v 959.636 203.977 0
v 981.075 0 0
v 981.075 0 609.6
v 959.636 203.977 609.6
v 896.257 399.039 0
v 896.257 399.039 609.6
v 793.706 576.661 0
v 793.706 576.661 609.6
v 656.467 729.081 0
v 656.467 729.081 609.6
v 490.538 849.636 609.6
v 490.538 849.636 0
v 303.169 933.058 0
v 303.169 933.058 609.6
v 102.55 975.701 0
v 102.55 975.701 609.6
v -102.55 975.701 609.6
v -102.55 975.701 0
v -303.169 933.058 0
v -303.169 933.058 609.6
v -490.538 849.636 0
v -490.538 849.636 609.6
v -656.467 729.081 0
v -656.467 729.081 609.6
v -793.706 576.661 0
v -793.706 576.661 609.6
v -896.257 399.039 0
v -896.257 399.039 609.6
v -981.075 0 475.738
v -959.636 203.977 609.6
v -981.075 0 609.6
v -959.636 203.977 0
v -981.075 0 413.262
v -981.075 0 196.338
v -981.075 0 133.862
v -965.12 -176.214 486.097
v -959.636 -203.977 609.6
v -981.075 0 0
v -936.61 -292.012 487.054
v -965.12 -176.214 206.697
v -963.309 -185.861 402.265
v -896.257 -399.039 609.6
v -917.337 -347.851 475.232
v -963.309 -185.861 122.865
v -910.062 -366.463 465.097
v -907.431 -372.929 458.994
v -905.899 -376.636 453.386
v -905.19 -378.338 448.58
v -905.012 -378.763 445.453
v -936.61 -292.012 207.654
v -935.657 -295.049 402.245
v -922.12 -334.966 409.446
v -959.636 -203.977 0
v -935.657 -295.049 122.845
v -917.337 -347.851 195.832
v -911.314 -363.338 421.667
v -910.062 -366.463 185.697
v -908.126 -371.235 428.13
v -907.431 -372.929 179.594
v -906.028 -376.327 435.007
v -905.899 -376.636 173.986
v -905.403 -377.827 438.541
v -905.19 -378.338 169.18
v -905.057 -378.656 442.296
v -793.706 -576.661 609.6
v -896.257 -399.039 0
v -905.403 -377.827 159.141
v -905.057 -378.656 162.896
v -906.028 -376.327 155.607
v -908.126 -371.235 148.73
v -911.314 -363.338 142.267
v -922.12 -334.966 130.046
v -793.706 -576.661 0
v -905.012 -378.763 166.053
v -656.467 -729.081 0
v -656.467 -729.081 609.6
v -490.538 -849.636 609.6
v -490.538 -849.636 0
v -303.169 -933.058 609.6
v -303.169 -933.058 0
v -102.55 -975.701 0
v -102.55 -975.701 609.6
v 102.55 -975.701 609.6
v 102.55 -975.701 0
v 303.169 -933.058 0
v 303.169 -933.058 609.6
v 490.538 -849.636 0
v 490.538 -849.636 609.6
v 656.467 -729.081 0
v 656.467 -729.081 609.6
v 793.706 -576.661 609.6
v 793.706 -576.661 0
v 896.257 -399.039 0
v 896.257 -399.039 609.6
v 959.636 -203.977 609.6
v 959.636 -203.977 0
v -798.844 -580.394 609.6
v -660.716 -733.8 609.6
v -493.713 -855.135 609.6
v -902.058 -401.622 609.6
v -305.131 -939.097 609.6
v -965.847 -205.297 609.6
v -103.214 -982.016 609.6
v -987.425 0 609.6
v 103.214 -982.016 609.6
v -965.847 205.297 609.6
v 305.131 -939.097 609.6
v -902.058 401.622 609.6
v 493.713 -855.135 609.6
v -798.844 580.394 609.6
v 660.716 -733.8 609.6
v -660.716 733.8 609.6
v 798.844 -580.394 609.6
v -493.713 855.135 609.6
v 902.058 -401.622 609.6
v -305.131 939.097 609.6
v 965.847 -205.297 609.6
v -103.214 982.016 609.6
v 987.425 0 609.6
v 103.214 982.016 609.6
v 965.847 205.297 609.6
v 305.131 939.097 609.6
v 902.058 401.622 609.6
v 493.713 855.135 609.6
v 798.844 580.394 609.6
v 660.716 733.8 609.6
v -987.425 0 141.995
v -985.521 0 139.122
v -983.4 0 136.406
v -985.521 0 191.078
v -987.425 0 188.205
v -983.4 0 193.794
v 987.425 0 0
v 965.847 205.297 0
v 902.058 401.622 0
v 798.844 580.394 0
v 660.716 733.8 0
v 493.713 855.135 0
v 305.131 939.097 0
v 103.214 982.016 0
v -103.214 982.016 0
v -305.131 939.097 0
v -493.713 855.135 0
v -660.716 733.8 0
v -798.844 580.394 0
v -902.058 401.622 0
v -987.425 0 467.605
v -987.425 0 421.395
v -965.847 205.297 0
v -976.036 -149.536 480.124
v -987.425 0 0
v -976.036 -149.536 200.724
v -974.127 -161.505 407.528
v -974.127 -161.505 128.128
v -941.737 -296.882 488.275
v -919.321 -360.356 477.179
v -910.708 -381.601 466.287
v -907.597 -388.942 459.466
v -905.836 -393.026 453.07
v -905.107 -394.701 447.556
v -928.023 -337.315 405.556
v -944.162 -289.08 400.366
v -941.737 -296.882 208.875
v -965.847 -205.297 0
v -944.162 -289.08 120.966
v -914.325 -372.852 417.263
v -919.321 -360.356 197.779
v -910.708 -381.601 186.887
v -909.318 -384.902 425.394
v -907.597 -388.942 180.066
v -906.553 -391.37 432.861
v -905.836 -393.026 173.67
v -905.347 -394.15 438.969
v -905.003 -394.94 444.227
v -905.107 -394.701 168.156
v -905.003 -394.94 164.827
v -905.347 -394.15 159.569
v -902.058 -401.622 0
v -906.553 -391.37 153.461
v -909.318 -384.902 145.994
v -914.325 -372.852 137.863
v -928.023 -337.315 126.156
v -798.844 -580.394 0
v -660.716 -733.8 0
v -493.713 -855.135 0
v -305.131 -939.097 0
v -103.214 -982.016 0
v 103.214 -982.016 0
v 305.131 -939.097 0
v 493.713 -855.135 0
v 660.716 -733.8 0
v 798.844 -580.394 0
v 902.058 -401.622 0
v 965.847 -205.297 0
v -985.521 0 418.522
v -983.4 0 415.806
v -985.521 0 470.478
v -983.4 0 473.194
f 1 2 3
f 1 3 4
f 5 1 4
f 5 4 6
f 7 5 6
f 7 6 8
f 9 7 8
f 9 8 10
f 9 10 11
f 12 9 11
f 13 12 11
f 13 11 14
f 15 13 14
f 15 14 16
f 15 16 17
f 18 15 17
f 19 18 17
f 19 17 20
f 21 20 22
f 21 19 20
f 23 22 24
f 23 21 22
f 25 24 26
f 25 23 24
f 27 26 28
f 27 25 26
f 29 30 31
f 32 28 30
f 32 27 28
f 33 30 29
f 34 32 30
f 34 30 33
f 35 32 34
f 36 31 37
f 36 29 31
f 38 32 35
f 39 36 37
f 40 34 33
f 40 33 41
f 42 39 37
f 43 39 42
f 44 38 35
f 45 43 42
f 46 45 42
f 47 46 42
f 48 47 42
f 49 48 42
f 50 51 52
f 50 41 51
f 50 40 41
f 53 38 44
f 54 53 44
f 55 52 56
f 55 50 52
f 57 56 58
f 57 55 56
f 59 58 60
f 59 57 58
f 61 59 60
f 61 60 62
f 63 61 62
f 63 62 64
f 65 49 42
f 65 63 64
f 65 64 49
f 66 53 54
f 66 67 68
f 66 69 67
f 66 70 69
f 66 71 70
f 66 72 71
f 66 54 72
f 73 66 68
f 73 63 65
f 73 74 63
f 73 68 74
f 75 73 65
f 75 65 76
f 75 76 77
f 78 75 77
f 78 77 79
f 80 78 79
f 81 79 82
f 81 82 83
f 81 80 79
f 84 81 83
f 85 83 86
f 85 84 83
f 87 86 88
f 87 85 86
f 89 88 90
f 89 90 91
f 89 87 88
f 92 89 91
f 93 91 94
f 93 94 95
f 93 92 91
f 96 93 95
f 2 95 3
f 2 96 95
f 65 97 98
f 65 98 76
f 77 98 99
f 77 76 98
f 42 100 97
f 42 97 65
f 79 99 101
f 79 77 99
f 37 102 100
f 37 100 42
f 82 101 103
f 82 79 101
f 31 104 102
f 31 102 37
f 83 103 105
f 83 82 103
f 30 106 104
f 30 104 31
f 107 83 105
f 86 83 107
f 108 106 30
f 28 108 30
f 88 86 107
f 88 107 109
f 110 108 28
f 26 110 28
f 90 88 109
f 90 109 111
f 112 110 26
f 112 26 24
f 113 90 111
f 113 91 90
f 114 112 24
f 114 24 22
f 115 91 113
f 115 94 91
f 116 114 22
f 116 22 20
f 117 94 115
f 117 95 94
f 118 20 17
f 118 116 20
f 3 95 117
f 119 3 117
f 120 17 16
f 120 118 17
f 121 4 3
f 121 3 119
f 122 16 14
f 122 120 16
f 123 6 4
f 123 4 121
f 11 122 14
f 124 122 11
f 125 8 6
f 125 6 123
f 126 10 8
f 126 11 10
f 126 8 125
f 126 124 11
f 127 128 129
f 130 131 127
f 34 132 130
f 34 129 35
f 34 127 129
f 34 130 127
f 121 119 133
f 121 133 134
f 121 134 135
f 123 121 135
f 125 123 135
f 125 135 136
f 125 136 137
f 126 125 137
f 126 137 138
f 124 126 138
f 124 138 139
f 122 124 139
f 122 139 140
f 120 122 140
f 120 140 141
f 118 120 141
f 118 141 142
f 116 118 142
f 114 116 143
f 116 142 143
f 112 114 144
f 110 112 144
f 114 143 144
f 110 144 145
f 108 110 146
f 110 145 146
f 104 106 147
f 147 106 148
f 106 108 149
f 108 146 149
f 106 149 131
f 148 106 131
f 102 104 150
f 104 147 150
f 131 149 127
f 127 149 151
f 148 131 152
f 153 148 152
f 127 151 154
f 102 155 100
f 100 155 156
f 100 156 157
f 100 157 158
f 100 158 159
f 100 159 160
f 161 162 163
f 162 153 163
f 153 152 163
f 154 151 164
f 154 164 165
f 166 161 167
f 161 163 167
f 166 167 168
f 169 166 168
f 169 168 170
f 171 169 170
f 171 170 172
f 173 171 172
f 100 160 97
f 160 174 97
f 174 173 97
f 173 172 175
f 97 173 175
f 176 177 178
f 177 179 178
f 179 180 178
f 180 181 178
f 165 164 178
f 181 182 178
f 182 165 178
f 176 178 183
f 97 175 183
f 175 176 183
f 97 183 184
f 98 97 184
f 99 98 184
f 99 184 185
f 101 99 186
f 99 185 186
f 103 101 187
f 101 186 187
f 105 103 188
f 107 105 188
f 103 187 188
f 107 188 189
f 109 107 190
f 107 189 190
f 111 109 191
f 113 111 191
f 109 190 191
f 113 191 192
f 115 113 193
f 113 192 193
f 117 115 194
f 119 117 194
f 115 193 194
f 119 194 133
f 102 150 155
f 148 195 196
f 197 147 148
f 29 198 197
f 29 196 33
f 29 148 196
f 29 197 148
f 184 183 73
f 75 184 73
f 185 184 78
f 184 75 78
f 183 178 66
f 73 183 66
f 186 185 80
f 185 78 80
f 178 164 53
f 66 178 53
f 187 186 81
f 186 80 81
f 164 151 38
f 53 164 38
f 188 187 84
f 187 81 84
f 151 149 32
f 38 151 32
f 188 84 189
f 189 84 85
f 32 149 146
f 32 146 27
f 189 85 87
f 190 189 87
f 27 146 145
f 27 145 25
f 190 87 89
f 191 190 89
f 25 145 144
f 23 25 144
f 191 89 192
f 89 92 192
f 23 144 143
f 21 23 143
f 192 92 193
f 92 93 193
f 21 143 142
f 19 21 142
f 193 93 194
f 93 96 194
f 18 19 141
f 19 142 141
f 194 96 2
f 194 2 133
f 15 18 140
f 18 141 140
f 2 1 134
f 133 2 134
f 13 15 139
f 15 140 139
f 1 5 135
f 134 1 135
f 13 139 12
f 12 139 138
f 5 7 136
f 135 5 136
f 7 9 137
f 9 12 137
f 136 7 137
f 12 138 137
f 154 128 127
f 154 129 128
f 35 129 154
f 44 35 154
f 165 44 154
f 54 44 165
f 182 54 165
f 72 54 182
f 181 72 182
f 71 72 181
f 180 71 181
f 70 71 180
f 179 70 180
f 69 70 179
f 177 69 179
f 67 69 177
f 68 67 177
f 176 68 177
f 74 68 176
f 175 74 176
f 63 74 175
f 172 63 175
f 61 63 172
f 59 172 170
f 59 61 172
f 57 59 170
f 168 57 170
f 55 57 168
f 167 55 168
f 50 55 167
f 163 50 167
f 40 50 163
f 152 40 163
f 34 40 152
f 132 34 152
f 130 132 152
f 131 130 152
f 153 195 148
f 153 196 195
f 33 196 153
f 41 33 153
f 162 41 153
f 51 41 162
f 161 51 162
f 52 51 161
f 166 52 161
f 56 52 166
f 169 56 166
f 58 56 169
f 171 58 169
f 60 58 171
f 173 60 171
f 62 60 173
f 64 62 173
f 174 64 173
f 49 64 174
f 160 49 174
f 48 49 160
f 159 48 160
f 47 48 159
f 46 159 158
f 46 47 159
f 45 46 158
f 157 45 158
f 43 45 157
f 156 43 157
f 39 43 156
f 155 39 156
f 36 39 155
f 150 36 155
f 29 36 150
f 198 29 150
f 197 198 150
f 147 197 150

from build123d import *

# Parameters (mm, degrees)
F0_R     = 987.425
F0_R_2   = 981.075
F1_DEPTH = 609.6
F2_R     = 44.45
F3_DEPTH = 987.426


with BuildPart() as f1:
    # F0 (on Top) → F1 (new body)
    with BuildSketch(Plane.XY):
        Circle(F0_R)
        Circle(F0_R_2, mode=Mode.SUBTRACT)
    extrude(amount=F1_DEPTH)

    # F2 (on Front) → F3 (cut, through all)
    with BuildSketch(Plane.XZ):
        with Locations((-949.452, 444.5)):
            Circle(F2_R)
        with Locations((-949.452, 165.1)):
            Circle(F2_R)
    extrude(amount=F3_DEPTH, mode=Mode.SUBTRACT)


solid = f1.part
